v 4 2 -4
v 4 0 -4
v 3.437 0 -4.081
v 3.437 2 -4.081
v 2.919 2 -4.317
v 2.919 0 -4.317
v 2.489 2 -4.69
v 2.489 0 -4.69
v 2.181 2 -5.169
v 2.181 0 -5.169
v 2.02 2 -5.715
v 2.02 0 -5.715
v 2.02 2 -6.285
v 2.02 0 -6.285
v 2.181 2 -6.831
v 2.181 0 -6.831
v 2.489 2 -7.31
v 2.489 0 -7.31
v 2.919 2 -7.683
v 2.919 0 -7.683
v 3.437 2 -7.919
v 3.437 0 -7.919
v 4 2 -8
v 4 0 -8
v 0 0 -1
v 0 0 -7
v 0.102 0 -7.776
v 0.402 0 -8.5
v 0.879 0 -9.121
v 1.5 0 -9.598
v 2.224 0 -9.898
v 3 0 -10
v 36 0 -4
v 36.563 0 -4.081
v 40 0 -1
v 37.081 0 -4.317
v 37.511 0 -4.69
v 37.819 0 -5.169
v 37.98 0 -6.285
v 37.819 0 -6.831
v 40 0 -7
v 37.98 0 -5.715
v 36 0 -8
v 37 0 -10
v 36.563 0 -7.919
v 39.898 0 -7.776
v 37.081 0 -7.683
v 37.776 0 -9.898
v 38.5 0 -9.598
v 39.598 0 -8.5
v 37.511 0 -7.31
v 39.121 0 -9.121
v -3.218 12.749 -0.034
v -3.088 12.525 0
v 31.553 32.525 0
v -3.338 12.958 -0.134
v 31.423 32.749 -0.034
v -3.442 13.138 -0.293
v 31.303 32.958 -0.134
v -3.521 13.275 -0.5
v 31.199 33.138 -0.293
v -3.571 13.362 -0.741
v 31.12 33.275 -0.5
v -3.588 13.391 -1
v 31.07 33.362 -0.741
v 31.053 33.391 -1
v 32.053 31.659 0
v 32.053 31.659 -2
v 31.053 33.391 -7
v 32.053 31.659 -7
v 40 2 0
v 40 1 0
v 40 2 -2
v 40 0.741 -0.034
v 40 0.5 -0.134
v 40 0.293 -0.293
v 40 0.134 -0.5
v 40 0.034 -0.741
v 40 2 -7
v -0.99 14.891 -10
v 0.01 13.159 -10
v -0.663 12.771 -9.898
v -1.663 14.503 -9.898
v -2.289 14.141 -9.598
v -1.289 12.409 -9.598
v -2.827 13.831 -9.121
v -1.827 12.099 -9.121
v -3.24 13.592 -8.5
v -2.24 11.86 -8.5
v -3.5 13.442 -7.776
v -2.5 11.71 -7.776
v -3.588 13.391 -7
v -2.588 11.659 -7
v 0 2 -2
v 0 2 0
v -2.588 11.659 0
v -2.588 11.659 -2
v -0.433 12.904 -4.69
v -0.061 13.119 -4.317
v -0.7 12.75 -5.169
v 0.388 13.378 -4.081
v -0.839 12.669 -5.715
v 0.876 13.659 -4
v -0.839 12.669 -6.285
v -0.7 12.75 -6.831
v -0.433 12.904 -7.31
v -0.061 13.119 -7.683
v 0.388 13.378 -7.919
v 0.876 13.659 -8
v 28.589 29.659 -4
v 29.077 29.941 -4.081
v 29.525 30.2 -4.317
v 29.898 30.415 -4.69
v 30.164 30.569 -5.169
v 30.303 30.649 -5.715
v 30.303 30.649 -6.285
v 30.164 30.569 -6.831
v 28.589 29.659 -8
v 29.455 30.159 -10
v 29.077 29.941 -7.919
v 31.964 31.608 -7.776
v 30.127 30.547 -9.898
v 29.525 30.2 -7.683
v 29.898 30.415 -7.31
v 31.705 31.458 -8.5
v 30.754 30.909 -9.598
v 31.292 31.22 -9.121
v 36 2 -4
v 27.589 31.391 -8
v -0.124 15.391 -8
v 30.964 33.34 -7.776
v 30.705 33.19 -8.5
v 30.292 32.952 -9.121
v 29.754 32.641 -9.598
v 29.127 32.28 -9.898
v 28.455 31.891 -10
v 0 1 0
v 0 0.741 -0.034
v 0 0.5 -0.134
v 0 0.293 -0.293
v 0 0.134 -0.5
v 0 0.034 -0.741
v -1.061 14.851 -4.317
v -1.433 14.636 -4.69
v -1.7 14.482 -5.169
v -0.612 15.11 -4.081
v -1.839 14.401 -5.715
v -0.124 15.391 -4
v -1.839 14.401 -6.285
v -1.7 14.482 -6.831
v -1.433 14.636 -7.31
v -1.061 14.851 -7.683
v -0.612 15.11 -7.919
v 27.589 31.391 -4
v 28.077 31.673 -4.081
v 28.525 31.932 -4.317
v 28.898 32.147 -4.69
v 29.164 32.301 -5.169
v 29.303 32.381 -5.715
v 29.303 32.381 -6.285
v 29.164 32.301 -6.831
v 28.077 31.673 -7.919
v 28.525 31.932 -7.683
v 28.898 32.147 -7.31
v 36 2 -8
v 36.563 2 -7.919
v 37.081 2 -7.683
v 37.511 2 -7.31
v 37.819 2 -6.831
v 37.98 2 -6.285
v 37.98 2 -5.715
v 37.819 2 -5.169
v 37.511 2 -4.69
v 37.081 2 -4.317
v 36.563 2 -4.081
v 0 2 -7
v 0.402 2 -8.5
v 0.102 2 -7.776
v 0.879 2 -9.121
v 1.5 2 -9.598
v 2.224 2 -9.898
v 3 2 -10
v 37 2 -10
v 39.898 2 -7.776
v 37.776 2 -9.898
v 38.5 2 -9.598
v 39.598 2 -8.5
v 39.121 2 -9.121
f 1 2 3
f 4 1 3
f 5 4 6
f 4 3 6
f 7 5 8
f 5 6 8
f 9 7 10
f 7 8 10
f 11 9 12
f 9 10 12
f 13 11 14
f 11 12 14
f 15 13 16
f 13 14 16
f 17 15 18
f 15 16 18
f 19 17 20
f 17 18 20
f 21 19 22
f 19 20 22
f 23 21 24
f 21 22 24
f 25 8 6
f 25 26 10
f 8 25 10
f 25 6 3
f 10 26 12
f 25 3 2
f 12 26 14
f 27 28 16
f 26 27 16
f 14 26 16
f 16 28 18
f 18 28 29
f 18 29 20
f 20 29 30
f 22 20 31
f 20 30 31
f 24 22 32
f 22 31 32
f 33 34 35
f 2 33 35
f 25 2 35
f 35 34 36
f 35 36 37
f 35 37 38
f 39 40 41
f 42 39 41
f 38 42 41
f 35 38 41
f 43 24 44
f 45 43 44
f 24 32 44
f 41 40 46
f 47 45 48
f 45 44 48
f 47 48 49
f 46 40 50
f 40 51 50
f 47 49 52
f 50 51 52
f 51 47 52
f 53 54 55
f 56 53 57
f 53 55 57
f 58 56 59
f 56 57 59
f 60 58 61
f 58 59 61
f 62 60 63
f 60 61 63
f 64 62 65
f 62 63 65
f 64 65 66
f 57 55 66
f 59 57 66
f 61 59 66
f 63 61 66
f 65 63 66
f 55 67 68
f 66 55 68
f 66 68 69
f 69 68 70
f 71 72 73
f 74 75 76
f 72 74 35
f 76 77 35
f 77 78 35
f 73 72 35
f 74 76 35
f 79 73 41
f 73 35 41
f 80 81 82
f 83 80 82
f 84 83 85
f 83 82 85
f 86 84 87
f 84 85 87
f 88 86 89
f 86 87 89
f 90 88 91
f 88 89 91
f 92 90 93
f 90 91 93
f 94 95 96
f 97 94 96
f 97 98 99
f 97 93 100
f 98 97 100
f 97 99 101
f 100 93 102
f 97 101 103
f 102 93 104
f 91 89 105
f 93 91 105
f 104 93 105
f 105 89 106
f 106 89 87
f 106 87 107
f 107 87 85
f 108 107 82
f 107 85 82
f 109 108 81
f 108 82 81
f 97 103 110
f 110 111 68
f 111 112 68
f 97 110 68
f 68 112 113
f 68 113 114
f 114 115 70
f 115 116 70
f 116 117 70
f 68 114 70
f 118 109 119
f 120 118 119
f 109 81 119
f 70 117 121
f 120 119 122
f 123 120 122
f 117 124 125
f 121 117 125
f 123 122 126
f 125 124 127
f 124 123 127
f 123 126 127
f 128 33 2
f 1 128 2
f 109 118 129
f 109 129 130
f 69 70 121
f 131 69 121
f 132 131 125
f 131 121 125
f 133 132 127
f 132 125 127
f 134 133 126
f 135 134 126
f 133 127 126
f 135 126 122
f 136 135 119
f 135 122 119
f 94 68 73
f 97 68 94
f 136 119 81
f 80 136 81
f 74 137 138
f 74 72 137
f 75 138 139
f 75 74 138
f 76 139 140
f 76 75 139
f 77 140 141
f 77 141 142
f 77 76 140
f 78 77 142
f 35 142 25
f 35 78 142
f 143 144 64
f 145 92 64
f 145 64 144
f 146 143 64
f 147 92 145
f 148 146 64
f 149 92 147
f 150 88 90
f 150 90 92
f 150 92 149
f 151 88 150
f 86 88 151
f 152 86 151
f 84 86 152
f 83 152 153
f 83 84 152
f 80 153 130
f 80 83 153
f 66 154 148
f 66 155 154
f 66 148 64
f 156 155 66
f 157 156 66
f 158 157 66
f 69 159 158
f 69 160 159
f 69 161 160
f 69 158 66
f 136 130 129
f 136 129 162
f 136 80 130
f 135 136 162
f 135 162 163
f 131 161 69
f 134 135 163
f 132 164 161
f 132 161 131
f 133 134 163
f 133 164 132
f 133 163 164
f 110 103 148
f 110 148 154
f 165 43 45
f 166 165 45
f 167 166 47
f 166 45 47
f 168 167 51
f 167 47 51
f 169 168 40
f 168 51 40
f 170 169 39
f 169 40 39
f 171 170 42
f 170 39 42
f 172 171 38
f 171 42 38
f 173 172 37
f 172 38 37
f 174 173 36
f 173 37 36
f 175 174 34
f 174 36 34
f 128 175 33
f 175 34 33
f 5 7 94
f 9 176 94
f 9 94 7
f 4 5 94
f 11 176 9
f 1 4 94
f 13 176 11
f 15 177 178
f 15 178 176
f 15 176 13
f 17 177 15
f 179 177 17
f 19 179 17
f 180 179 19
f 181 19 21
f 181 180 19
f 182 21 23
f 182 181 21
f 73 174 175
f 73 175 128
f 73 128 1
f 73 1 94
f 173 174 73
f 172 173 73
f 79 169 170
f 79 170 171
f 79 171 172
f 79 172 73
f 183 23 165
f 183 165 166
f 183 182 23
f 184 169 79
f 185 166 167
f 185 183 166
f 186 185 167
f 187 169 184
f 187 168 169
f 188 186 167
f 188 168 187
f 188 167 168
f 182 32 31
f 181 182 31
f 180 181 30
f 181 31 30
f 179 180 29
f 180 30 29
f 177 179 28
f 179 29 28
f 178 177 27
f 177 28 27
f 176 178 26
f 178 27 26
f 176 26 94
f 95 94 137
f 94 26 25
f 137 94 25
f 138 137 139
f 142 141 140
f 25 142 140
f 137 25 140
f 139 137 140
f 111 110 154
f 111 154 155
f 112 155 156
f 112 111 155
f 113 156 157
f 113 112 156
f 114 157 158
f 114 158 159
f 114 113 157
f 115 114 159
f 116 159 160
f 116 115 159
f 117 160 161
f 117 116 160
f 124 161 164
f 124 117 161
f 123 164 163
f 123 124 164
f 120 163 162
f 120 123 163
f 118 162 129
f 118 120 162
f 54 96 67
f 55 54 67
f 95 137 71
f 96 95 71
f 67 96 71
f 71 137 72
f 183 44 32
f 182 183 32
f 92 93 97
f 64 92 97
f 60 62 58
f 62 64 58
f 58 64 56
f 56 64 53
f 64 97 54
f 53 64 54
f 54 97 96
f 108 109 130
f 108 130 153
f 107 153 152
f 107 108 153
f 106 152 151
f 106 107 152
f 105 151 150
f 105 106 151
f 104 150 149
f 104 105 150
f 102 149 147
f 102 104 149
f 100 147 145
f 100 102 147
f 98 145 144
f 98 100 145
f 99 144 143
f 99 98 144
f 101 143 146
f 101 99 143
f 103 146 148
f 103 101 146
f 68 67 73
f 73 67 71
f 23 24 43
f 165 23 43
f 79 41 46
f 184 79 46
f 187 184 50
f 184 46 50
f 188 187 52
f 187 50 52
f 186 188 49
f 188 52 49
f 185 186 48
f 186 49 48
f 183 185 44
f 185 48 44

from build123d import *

# Parameters (mm, degrees)
BOSS_EXTRUDE2_DEPTH = 2
BOSS_EXTRUDE3_DEPTH = 2
BOSS_EXTRUDE4_DEPTH = 2
FILLET1_R           = 1
FILLET2_R           = 1


with BuildPart() as part:
    # Sketch1 → Boss-Extrude2 (new body)
    with BuildSketch(Plane(origin=(0, 0, 0), x_dir=(1, 0, 0), z_dir=(0, 1, 0))):
        with BuildLine():
            Line((0, 0), (40, 0))
            Line((40, 0), (40, 7))
            ThreePointArc((40, 7), (39.121320344, 9.121320344), (37, 10))
            Line((37, 10), (3, 10))
            ThreePointArc((3, 10), (0.878679656, 9.121320344), (0, 7))
            Line((0, 7), (0, 0))
        make_face()
        with BuildLine():
            Line((4, 8), (36, 8))
            ThreePointArc((36, 8), (38, 6), (36, 4))
            Line((36, 4), (4, 4))
            ThreePointArc((4, 4), (2, 6), (4, 8))
        make_face(mode=Mode.SUBTRACT)
    extrude(amount=BOSS_EXTRUDE2_DEPTH)

    # Sketch2 → Boss-Extrude3 (add)
    with BuildSketch(Plane.XY):
        Polygon((0, 2), (-2.588190451, 11.659258263), (32.0528257, 31.659258263), (40, 2), align=None)
    extrude(amount=-BOSS_EXTRUDE3_DEPTH)

    # Sketch3 → Boss-Extrude4 (add)
    with BuildSketch(Plane(origin=(-5.695654535, 9.865163037, 0), x_dir=(0.866025403784438, 0.5000000000000012, 0), z_dir=(-0.5000000000000012, 0.866025403784438, 0))):
        with BuildLine():
            Line((3.588190451, 0), (43.588190451, 0))
            Line((43.588190451, 0), (43.588190451, 7))
            ThreePointArc((43.588190451, 7), (42.709510795, 9.121320344), (40.588190451, 10))
            Line((40.588190451, 10), (6.588190451, 10))
            ThreePointArc((6.588190451, 10), (4.466870107, 9.121320344), (3.588190451, 7))
            Line((3.588190451, 7), (3.588190451, 0))
        make_face()
        with BuildLine():
            Line((7.588190451, 4), (39.588190451, 4))
            ThreePointArc((39.588190451, 4), (41.588190451, 6), (39.588190451, 8))
            Line((39.588190451, 8), (7.588190451, 8))
            ThreePointArc((7.588190451, 8), (5.588190451, 6), (7.588190451, 4))
        make_face(mode=Mode.SUBTRACT)
    extrude(amount=BOSS_EXTRUDE4_DEPTH)

    # Fillet1
    fillet1_edges = [part.edges().sort_by_distance(p)[0] for p in [
        (20, 0, 0),
    ]]
    fillet(fillet1_edges, radius=FILLET1_R)

    # Fillet2
    fillet2_edges = [part.edges().sort_by_distance(p)[0] for p in [
        (13.732317625, 23.39130907, 0),
    ]]
    fillet(fillet2_edges, radius=FILLET2_R)


solid = part.part
